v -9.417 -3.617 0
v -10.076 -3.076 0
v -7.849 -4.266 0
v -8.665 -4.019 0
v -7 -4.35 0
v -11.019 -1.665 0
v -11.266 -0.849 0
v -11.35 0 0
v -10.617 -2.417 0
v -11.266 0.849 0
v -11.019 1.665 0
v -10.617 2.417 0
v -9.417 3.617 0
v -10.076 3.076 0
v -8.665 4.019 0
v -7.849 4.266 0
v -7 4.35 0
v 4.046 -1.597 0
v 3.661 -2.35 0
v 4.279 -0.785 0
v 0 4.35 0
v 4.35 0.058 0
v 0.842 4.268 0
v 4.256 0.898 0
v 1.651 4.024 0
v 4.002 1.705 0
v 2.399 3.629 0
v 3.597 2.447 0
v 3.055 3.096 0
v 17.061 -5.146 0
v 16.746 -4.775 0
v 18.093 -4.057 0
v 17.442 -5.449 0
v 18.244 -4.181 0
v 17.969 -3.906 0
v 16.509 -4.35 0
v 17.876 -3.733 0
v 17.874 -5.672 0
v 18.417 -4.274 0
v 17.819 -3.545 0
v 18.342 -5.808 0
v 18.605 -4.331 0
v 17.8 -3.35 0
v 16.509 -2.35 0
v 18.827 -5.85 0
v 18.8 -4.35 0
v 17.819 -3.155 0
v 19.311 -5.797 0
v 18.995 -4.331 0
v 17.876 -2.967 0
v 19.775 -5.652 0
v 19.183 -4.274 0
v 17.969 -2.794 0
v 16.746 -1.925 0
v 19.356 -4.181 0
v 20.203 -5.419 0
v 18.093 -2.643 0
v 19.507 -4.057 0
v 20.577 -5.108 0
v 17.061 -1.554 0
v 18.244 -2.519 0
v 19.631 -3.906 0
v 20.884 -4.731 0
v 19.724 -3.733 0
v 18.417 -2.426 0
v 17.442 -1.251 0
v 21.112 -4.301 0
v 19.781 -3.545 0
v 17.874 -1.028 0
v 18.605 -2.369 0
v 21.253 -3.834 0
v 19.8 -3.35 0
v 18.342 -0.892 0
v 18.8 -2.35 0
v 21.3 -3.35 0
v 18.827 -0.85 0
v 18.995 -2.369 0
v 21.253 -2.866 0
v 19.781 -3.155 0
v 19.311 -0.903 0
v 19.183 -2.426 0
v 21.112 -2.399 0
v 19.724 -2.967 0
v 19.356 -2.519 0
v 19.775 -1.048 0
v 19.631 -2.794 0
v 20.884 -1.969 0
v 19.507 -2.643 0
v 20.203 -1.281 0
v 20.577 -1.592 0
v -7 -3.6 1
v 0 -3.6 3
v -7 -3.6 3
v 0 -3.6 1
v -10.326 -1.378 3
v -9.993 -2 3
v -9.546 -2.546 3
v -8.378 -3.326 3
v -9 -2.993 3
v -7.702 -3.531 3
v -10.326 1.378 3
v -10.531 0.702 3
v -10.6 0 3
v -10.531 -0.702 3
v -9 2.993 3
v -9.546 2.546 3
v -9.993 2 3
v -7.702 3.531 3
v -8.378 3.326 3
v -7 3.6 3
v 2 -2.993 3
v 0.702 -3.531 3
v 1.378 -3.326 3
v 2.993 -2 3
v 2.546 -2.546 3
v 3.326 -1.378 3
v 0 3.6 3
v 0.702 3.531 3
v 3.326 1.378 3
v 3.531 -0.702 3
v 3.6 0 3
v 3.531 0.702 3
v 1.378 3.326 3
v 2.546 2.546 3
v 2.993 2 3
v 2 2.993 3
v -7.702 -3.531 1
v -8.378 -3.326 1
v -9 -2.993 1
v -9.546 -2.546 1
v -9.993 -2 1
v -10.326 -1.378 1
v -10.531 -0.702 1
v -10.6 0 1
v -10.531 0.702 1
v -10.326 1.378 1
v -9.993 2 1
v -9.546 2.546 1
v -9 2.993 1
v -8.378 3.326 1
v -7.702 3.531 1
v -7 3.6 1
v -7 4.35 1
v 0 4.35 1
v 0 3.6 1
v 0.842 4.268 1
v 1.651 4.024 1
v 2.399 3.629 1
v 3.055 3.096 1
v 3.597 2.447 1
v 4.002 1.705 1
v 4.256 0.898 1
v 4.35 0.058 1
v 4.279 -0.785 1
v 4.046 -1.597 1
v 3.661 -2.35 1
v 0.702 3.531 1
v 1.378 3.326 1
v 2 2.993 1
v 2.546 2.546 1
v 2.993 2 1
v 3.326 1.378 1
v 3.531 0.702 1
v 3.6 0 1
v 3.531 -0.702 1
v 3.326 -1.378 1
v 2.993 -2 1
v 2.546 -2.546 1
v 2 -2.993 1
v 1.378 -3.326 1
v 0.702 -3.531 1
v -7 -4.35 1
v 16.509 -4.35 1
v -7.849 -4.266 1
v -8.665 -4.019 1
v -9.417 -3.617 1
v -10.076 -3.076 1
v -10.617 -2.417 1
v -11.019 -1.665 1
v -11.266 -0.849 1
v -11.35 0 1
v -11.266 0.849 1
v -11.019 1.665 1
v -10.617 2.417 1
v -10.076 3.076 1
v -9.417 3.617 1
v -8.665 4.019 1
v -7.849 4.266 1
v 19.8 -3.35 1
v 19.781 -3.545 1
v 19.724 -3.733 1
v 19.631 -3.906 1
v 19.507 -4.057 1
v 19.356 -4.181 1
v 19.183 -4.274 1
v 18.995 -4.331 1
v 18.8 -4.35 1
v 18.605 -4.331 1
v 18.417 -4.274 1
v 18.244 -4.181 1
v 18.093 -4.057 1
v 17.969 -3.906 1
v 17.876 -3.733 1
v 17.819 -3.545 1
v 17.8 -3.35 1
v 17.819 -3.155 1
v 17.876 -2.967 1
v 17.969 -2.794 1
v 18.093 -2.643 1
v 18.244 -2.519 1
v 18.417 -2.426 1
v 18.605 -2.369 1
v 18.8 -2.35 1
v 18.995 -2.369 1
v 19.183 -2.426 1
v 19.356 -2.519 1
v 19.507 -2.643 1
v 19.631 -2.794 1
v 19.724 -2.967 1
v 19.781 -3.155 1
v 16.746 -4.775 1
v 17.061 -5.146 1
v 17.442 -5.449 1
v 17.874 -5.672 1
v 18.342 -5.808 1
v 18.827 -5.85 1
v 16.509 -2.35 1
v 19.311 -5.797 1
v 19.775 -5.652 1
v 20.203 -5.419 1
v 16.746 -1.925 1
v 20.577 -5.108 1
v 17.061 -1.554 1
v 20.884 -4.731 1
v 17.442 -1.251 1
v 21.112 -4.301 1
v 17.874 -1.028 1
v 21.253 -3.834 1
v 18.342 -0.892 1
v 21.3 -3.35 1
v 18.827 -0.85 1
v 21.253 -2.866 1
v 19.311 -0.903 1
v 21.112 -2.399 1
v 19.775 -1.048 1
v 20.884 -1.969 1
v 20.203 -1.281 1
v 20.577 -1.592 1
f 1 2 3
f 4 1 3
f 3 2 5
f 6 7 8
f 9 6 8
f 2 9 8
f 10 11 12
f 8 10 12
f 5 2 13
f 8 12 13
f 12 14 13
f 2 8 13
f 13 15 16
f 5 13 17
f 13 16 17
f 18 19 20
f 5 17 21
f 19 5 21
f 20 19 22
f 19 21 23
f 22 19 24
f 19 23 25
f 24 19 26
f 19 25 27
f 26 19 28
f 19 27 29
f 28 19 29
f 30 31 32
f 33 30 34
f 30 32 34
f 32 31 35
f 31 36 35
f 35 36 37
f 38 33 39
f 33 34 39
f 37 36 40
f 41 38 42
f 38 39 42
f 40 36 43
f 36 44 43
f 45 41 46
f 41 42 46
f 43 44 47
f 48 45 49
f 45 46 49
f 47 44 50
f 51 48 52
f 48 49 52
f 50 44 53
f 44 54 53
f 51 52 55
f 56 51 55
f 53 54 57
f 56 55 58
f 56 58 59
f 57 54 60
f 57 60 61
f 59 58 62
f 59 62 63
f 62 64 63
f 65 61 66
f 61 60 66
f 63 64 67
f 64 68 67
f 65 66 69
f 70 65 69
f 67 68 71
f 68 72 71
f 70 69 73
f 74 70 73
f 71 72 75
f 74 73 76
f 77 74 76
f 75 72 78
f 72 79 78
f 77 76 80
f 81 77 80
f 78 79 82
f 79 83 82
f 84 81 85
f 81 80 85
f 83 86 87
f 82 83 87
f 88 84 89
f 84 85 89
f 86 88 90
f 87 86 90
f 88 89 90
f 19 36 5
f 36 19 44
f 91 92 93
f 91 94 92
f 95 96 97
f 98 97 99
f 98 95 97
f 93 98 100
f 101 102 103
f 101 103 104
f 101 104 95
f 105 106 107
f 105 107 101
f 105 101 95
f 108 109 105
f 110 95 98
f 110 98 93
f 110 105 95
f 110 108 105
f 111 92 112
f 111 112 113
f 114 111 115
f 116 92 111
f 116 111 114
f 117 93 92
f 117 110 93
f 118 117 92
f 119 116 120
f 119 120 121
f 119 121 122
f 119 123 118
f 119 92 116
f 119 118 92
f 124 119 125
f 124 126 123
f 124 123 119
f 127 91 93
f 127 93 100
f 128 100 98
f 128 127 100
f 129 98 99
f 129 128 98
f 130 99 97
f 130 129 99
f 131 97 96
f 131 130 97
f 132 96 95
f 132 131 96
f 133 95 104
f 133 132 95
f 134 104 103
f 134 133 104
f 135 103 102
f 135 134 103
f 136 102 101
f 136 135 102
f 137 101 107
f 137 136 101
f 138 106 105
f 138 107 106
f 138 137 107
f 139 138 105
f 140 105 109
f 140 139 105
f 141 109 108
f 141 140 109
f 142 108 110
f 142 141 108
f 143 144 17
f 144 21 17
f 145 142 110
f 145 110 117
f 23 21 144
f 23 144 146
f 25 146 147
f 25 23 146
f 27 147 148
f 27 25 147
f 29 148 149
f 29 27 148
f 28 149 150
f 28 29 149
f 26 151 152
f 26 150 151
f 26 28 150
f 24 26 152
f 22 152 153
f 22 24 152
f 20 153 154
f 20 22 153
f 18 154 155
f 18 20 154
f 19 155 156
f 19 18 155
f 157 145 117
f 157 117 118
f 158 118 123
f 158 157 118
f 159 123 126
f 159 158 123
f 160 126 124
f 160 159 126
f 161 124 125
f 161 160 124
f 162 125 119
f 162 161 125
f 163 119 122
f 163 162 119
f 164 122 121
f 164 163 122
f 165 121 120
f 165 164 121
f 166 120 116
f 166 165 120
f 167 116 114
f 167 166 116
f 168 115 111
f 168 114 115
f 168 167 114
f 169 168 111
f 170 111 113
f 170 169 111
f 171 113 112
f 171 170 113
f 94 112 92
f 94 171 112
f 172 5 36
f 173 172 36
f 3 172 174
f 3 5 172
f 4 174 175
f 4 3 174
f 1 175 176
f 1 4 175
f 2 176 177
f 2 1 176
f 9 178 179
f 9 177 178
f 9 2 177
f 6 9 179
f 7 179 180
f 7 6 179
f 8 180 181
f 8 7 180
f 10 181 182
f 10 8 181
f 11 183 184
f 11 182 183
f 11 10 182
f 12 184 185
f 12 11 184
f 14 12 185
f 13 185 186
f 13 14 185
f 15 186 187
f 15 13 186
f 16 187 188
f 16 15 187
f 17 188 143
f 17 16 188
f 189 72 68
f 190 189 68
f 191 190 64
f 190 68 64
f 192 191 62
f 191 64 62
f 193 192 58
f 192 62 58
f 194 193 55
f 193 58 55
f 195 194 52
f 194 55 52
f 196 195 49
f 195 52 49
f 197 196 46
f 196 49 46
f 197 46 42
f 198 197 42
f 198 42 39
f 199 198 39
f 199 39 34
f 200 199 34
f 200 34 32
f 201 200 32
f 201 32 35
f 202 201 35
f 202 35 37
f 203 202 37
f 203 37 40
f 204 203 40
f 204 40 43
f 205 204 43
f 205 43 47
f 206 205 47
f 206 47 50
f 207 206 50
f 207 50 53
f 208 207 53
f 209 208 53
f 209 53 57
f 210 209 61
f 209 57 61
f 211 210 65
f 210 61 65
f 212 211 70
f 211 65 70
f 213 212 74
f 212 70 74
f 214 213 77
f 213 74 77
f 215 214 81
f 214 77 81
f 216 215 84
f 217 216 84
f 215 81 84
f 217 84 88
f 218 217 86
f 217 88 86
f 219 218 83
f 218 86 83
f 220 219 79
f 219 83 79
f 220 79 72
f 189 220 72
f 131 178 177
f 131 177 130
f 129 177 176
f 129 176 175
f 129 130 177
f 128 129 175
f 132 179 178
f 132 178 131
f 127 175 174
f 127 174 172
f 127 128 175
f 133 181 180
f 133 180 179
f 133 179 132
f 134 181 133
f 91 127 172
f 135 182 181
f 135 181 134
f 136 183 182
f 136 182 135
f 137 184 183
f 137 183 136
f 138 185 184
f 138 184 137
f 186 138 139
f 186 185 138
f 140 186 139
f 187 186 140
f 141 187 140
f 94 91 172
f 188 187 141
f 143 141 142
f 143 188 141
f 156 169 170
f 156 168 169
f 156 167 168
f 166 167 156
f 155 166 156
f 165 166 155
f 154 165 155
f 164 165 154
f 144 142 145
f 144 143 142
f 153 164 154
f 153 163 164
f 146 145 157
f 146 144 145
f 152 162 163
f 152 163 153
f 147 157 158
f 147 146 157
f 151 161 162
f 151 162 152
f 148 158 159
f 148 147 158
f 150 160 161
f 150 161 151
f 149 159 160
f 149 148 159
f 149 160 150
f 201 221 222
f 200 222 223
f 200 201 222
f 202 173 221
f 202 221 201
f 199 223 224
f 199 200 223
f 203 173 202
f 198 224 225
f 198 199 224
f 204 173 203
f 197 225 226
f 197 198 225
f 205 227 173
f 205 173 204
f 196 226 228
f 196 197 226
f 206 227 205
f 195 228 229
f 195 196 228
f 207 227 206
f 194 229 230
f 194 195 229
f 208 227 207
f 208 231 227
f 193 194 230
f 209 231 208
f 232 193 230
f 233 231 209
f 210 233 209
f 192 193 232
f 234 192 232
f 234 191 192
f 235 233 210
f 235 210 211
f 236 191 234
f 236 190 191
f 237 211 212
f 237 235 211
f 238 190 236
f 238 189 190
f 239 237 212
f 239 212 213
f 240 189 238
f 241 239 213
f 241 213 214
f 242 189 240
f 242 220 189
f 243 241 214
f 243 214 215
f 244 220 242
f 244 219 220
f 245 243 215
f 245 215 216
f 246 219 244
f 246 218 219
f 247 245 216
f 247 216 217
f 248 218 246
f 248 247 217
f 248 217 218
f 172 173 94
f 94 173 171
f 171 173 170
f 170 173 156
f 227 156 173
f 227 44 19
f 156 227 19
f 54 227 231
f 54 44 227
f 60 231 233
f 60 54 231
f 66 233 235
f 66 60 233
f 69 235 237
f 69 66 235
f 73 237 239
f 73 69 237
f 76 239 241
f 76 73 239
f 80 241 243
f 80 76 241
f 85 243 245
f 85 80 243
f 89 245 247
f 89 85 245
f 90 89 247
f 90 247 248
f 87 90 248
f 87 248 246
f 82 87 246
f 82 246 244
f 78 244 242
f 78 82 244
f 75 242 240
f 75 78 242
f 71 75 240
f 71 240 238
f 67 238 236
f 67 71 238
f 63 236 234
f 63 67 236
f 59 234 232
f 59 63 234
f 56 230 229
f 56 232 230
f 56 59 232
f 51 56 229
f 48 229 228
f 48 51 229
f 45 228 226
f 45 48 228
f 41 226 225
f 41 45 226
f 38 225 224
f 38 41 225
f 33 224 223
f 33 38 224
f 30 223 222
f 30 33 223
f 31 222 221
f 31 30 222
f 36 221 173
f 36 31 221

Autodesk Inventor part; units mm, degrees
ref_plane "YZ Plane" through (0, 0, 0) normal (1, 0, 0) x (0, 1, 0)
ref_plane "XZ Plane" through (0, 0, 0) normal (0, 1, 0) x (-1, 0, 0)
ref_plane "XY Plane" through (0, 0, 0) normal (0, 0, 1) x (1, 0, 0)
sketch "Sketch1" plane through (0, 0, 0) normal (0, 0, 1) x (1, 0, 0)
  line L0 (0, 0) -> (-7, 0) construction
  line L1 (0, 4.35) -> (-7, 4.35)
  line L2 (-7, -4.35) -> (0, -4.35)
  arc A0 (0, -4.35) -> (0, 4.35) centre (0, 0) ccw
  arc A1 (-7, 4.35) -> (-7, -4.35) centre (-7, 0) ccw
  line L3 (-7, 3.6) -> (0, 3.6)
  arc A2 (0, -3.6) -> (0, 3.6) centre (0, 0) ccw
  line L4 (0, -3.6) -> (-7, -3.6)
  arc A3 (-7, 3.6) -> (-7, -3.6) centre (-7, 0) ccw
  line L5 (0, -4.35) -> (19.2, -4.35)
  line L6 (20, -3.55) -> (20, -3.15)
  line L7 (19.2, -2.35) -> (3.6606, -2.35)
  circle A4 centre (18.8, -3.35) radius 1
  arc A5 (20, -3.15) -> (19.2, -2.35) centre (19.2, -3.15) ccw
  arc A6 (19.2, -4.35) -> (20, -3.55) centre (19.2, -3.55) ccw
  arc A7 (16.5087, -4.35) -> (16.5087, -2.35) centre (18.8, -3.35) ccw
  line L8 (18.8, -3.35) -> (5.3494, -3.35) construction
  point P0 (-3.5, 0)
  point P1 (20, -4.35)
  point P2 (20, -2.35)
  dimension "d0" = 7
  dimension "d1" = 8.7
  dimension "d5" = 3.6
  dimension "d6" = 2
  dimension "d7" = 2
  dimension "d8" = 20
  dimension "d9" = 1.2
  dimension "d10" = 0.8
  dimension "d13" = 5
  dimension "d14" = 1
extrude "Extrusion1" add sketch "Sketch1" along normal blind 1 contours A0 L2 A1 L1 | L7 A4 L5 A0 | A7 L5 A6 L6 A5 L7 | L7 A5 L6 A6 L5 A4 | L3 A2 L4 A3
extrude "Extrusion2" add sketch "Sketch1" along normal blind 2 from surface at 1 contours L3 A2 L4 A3
properties part number "tappino tpu" material "Thermoplastic Resin"
